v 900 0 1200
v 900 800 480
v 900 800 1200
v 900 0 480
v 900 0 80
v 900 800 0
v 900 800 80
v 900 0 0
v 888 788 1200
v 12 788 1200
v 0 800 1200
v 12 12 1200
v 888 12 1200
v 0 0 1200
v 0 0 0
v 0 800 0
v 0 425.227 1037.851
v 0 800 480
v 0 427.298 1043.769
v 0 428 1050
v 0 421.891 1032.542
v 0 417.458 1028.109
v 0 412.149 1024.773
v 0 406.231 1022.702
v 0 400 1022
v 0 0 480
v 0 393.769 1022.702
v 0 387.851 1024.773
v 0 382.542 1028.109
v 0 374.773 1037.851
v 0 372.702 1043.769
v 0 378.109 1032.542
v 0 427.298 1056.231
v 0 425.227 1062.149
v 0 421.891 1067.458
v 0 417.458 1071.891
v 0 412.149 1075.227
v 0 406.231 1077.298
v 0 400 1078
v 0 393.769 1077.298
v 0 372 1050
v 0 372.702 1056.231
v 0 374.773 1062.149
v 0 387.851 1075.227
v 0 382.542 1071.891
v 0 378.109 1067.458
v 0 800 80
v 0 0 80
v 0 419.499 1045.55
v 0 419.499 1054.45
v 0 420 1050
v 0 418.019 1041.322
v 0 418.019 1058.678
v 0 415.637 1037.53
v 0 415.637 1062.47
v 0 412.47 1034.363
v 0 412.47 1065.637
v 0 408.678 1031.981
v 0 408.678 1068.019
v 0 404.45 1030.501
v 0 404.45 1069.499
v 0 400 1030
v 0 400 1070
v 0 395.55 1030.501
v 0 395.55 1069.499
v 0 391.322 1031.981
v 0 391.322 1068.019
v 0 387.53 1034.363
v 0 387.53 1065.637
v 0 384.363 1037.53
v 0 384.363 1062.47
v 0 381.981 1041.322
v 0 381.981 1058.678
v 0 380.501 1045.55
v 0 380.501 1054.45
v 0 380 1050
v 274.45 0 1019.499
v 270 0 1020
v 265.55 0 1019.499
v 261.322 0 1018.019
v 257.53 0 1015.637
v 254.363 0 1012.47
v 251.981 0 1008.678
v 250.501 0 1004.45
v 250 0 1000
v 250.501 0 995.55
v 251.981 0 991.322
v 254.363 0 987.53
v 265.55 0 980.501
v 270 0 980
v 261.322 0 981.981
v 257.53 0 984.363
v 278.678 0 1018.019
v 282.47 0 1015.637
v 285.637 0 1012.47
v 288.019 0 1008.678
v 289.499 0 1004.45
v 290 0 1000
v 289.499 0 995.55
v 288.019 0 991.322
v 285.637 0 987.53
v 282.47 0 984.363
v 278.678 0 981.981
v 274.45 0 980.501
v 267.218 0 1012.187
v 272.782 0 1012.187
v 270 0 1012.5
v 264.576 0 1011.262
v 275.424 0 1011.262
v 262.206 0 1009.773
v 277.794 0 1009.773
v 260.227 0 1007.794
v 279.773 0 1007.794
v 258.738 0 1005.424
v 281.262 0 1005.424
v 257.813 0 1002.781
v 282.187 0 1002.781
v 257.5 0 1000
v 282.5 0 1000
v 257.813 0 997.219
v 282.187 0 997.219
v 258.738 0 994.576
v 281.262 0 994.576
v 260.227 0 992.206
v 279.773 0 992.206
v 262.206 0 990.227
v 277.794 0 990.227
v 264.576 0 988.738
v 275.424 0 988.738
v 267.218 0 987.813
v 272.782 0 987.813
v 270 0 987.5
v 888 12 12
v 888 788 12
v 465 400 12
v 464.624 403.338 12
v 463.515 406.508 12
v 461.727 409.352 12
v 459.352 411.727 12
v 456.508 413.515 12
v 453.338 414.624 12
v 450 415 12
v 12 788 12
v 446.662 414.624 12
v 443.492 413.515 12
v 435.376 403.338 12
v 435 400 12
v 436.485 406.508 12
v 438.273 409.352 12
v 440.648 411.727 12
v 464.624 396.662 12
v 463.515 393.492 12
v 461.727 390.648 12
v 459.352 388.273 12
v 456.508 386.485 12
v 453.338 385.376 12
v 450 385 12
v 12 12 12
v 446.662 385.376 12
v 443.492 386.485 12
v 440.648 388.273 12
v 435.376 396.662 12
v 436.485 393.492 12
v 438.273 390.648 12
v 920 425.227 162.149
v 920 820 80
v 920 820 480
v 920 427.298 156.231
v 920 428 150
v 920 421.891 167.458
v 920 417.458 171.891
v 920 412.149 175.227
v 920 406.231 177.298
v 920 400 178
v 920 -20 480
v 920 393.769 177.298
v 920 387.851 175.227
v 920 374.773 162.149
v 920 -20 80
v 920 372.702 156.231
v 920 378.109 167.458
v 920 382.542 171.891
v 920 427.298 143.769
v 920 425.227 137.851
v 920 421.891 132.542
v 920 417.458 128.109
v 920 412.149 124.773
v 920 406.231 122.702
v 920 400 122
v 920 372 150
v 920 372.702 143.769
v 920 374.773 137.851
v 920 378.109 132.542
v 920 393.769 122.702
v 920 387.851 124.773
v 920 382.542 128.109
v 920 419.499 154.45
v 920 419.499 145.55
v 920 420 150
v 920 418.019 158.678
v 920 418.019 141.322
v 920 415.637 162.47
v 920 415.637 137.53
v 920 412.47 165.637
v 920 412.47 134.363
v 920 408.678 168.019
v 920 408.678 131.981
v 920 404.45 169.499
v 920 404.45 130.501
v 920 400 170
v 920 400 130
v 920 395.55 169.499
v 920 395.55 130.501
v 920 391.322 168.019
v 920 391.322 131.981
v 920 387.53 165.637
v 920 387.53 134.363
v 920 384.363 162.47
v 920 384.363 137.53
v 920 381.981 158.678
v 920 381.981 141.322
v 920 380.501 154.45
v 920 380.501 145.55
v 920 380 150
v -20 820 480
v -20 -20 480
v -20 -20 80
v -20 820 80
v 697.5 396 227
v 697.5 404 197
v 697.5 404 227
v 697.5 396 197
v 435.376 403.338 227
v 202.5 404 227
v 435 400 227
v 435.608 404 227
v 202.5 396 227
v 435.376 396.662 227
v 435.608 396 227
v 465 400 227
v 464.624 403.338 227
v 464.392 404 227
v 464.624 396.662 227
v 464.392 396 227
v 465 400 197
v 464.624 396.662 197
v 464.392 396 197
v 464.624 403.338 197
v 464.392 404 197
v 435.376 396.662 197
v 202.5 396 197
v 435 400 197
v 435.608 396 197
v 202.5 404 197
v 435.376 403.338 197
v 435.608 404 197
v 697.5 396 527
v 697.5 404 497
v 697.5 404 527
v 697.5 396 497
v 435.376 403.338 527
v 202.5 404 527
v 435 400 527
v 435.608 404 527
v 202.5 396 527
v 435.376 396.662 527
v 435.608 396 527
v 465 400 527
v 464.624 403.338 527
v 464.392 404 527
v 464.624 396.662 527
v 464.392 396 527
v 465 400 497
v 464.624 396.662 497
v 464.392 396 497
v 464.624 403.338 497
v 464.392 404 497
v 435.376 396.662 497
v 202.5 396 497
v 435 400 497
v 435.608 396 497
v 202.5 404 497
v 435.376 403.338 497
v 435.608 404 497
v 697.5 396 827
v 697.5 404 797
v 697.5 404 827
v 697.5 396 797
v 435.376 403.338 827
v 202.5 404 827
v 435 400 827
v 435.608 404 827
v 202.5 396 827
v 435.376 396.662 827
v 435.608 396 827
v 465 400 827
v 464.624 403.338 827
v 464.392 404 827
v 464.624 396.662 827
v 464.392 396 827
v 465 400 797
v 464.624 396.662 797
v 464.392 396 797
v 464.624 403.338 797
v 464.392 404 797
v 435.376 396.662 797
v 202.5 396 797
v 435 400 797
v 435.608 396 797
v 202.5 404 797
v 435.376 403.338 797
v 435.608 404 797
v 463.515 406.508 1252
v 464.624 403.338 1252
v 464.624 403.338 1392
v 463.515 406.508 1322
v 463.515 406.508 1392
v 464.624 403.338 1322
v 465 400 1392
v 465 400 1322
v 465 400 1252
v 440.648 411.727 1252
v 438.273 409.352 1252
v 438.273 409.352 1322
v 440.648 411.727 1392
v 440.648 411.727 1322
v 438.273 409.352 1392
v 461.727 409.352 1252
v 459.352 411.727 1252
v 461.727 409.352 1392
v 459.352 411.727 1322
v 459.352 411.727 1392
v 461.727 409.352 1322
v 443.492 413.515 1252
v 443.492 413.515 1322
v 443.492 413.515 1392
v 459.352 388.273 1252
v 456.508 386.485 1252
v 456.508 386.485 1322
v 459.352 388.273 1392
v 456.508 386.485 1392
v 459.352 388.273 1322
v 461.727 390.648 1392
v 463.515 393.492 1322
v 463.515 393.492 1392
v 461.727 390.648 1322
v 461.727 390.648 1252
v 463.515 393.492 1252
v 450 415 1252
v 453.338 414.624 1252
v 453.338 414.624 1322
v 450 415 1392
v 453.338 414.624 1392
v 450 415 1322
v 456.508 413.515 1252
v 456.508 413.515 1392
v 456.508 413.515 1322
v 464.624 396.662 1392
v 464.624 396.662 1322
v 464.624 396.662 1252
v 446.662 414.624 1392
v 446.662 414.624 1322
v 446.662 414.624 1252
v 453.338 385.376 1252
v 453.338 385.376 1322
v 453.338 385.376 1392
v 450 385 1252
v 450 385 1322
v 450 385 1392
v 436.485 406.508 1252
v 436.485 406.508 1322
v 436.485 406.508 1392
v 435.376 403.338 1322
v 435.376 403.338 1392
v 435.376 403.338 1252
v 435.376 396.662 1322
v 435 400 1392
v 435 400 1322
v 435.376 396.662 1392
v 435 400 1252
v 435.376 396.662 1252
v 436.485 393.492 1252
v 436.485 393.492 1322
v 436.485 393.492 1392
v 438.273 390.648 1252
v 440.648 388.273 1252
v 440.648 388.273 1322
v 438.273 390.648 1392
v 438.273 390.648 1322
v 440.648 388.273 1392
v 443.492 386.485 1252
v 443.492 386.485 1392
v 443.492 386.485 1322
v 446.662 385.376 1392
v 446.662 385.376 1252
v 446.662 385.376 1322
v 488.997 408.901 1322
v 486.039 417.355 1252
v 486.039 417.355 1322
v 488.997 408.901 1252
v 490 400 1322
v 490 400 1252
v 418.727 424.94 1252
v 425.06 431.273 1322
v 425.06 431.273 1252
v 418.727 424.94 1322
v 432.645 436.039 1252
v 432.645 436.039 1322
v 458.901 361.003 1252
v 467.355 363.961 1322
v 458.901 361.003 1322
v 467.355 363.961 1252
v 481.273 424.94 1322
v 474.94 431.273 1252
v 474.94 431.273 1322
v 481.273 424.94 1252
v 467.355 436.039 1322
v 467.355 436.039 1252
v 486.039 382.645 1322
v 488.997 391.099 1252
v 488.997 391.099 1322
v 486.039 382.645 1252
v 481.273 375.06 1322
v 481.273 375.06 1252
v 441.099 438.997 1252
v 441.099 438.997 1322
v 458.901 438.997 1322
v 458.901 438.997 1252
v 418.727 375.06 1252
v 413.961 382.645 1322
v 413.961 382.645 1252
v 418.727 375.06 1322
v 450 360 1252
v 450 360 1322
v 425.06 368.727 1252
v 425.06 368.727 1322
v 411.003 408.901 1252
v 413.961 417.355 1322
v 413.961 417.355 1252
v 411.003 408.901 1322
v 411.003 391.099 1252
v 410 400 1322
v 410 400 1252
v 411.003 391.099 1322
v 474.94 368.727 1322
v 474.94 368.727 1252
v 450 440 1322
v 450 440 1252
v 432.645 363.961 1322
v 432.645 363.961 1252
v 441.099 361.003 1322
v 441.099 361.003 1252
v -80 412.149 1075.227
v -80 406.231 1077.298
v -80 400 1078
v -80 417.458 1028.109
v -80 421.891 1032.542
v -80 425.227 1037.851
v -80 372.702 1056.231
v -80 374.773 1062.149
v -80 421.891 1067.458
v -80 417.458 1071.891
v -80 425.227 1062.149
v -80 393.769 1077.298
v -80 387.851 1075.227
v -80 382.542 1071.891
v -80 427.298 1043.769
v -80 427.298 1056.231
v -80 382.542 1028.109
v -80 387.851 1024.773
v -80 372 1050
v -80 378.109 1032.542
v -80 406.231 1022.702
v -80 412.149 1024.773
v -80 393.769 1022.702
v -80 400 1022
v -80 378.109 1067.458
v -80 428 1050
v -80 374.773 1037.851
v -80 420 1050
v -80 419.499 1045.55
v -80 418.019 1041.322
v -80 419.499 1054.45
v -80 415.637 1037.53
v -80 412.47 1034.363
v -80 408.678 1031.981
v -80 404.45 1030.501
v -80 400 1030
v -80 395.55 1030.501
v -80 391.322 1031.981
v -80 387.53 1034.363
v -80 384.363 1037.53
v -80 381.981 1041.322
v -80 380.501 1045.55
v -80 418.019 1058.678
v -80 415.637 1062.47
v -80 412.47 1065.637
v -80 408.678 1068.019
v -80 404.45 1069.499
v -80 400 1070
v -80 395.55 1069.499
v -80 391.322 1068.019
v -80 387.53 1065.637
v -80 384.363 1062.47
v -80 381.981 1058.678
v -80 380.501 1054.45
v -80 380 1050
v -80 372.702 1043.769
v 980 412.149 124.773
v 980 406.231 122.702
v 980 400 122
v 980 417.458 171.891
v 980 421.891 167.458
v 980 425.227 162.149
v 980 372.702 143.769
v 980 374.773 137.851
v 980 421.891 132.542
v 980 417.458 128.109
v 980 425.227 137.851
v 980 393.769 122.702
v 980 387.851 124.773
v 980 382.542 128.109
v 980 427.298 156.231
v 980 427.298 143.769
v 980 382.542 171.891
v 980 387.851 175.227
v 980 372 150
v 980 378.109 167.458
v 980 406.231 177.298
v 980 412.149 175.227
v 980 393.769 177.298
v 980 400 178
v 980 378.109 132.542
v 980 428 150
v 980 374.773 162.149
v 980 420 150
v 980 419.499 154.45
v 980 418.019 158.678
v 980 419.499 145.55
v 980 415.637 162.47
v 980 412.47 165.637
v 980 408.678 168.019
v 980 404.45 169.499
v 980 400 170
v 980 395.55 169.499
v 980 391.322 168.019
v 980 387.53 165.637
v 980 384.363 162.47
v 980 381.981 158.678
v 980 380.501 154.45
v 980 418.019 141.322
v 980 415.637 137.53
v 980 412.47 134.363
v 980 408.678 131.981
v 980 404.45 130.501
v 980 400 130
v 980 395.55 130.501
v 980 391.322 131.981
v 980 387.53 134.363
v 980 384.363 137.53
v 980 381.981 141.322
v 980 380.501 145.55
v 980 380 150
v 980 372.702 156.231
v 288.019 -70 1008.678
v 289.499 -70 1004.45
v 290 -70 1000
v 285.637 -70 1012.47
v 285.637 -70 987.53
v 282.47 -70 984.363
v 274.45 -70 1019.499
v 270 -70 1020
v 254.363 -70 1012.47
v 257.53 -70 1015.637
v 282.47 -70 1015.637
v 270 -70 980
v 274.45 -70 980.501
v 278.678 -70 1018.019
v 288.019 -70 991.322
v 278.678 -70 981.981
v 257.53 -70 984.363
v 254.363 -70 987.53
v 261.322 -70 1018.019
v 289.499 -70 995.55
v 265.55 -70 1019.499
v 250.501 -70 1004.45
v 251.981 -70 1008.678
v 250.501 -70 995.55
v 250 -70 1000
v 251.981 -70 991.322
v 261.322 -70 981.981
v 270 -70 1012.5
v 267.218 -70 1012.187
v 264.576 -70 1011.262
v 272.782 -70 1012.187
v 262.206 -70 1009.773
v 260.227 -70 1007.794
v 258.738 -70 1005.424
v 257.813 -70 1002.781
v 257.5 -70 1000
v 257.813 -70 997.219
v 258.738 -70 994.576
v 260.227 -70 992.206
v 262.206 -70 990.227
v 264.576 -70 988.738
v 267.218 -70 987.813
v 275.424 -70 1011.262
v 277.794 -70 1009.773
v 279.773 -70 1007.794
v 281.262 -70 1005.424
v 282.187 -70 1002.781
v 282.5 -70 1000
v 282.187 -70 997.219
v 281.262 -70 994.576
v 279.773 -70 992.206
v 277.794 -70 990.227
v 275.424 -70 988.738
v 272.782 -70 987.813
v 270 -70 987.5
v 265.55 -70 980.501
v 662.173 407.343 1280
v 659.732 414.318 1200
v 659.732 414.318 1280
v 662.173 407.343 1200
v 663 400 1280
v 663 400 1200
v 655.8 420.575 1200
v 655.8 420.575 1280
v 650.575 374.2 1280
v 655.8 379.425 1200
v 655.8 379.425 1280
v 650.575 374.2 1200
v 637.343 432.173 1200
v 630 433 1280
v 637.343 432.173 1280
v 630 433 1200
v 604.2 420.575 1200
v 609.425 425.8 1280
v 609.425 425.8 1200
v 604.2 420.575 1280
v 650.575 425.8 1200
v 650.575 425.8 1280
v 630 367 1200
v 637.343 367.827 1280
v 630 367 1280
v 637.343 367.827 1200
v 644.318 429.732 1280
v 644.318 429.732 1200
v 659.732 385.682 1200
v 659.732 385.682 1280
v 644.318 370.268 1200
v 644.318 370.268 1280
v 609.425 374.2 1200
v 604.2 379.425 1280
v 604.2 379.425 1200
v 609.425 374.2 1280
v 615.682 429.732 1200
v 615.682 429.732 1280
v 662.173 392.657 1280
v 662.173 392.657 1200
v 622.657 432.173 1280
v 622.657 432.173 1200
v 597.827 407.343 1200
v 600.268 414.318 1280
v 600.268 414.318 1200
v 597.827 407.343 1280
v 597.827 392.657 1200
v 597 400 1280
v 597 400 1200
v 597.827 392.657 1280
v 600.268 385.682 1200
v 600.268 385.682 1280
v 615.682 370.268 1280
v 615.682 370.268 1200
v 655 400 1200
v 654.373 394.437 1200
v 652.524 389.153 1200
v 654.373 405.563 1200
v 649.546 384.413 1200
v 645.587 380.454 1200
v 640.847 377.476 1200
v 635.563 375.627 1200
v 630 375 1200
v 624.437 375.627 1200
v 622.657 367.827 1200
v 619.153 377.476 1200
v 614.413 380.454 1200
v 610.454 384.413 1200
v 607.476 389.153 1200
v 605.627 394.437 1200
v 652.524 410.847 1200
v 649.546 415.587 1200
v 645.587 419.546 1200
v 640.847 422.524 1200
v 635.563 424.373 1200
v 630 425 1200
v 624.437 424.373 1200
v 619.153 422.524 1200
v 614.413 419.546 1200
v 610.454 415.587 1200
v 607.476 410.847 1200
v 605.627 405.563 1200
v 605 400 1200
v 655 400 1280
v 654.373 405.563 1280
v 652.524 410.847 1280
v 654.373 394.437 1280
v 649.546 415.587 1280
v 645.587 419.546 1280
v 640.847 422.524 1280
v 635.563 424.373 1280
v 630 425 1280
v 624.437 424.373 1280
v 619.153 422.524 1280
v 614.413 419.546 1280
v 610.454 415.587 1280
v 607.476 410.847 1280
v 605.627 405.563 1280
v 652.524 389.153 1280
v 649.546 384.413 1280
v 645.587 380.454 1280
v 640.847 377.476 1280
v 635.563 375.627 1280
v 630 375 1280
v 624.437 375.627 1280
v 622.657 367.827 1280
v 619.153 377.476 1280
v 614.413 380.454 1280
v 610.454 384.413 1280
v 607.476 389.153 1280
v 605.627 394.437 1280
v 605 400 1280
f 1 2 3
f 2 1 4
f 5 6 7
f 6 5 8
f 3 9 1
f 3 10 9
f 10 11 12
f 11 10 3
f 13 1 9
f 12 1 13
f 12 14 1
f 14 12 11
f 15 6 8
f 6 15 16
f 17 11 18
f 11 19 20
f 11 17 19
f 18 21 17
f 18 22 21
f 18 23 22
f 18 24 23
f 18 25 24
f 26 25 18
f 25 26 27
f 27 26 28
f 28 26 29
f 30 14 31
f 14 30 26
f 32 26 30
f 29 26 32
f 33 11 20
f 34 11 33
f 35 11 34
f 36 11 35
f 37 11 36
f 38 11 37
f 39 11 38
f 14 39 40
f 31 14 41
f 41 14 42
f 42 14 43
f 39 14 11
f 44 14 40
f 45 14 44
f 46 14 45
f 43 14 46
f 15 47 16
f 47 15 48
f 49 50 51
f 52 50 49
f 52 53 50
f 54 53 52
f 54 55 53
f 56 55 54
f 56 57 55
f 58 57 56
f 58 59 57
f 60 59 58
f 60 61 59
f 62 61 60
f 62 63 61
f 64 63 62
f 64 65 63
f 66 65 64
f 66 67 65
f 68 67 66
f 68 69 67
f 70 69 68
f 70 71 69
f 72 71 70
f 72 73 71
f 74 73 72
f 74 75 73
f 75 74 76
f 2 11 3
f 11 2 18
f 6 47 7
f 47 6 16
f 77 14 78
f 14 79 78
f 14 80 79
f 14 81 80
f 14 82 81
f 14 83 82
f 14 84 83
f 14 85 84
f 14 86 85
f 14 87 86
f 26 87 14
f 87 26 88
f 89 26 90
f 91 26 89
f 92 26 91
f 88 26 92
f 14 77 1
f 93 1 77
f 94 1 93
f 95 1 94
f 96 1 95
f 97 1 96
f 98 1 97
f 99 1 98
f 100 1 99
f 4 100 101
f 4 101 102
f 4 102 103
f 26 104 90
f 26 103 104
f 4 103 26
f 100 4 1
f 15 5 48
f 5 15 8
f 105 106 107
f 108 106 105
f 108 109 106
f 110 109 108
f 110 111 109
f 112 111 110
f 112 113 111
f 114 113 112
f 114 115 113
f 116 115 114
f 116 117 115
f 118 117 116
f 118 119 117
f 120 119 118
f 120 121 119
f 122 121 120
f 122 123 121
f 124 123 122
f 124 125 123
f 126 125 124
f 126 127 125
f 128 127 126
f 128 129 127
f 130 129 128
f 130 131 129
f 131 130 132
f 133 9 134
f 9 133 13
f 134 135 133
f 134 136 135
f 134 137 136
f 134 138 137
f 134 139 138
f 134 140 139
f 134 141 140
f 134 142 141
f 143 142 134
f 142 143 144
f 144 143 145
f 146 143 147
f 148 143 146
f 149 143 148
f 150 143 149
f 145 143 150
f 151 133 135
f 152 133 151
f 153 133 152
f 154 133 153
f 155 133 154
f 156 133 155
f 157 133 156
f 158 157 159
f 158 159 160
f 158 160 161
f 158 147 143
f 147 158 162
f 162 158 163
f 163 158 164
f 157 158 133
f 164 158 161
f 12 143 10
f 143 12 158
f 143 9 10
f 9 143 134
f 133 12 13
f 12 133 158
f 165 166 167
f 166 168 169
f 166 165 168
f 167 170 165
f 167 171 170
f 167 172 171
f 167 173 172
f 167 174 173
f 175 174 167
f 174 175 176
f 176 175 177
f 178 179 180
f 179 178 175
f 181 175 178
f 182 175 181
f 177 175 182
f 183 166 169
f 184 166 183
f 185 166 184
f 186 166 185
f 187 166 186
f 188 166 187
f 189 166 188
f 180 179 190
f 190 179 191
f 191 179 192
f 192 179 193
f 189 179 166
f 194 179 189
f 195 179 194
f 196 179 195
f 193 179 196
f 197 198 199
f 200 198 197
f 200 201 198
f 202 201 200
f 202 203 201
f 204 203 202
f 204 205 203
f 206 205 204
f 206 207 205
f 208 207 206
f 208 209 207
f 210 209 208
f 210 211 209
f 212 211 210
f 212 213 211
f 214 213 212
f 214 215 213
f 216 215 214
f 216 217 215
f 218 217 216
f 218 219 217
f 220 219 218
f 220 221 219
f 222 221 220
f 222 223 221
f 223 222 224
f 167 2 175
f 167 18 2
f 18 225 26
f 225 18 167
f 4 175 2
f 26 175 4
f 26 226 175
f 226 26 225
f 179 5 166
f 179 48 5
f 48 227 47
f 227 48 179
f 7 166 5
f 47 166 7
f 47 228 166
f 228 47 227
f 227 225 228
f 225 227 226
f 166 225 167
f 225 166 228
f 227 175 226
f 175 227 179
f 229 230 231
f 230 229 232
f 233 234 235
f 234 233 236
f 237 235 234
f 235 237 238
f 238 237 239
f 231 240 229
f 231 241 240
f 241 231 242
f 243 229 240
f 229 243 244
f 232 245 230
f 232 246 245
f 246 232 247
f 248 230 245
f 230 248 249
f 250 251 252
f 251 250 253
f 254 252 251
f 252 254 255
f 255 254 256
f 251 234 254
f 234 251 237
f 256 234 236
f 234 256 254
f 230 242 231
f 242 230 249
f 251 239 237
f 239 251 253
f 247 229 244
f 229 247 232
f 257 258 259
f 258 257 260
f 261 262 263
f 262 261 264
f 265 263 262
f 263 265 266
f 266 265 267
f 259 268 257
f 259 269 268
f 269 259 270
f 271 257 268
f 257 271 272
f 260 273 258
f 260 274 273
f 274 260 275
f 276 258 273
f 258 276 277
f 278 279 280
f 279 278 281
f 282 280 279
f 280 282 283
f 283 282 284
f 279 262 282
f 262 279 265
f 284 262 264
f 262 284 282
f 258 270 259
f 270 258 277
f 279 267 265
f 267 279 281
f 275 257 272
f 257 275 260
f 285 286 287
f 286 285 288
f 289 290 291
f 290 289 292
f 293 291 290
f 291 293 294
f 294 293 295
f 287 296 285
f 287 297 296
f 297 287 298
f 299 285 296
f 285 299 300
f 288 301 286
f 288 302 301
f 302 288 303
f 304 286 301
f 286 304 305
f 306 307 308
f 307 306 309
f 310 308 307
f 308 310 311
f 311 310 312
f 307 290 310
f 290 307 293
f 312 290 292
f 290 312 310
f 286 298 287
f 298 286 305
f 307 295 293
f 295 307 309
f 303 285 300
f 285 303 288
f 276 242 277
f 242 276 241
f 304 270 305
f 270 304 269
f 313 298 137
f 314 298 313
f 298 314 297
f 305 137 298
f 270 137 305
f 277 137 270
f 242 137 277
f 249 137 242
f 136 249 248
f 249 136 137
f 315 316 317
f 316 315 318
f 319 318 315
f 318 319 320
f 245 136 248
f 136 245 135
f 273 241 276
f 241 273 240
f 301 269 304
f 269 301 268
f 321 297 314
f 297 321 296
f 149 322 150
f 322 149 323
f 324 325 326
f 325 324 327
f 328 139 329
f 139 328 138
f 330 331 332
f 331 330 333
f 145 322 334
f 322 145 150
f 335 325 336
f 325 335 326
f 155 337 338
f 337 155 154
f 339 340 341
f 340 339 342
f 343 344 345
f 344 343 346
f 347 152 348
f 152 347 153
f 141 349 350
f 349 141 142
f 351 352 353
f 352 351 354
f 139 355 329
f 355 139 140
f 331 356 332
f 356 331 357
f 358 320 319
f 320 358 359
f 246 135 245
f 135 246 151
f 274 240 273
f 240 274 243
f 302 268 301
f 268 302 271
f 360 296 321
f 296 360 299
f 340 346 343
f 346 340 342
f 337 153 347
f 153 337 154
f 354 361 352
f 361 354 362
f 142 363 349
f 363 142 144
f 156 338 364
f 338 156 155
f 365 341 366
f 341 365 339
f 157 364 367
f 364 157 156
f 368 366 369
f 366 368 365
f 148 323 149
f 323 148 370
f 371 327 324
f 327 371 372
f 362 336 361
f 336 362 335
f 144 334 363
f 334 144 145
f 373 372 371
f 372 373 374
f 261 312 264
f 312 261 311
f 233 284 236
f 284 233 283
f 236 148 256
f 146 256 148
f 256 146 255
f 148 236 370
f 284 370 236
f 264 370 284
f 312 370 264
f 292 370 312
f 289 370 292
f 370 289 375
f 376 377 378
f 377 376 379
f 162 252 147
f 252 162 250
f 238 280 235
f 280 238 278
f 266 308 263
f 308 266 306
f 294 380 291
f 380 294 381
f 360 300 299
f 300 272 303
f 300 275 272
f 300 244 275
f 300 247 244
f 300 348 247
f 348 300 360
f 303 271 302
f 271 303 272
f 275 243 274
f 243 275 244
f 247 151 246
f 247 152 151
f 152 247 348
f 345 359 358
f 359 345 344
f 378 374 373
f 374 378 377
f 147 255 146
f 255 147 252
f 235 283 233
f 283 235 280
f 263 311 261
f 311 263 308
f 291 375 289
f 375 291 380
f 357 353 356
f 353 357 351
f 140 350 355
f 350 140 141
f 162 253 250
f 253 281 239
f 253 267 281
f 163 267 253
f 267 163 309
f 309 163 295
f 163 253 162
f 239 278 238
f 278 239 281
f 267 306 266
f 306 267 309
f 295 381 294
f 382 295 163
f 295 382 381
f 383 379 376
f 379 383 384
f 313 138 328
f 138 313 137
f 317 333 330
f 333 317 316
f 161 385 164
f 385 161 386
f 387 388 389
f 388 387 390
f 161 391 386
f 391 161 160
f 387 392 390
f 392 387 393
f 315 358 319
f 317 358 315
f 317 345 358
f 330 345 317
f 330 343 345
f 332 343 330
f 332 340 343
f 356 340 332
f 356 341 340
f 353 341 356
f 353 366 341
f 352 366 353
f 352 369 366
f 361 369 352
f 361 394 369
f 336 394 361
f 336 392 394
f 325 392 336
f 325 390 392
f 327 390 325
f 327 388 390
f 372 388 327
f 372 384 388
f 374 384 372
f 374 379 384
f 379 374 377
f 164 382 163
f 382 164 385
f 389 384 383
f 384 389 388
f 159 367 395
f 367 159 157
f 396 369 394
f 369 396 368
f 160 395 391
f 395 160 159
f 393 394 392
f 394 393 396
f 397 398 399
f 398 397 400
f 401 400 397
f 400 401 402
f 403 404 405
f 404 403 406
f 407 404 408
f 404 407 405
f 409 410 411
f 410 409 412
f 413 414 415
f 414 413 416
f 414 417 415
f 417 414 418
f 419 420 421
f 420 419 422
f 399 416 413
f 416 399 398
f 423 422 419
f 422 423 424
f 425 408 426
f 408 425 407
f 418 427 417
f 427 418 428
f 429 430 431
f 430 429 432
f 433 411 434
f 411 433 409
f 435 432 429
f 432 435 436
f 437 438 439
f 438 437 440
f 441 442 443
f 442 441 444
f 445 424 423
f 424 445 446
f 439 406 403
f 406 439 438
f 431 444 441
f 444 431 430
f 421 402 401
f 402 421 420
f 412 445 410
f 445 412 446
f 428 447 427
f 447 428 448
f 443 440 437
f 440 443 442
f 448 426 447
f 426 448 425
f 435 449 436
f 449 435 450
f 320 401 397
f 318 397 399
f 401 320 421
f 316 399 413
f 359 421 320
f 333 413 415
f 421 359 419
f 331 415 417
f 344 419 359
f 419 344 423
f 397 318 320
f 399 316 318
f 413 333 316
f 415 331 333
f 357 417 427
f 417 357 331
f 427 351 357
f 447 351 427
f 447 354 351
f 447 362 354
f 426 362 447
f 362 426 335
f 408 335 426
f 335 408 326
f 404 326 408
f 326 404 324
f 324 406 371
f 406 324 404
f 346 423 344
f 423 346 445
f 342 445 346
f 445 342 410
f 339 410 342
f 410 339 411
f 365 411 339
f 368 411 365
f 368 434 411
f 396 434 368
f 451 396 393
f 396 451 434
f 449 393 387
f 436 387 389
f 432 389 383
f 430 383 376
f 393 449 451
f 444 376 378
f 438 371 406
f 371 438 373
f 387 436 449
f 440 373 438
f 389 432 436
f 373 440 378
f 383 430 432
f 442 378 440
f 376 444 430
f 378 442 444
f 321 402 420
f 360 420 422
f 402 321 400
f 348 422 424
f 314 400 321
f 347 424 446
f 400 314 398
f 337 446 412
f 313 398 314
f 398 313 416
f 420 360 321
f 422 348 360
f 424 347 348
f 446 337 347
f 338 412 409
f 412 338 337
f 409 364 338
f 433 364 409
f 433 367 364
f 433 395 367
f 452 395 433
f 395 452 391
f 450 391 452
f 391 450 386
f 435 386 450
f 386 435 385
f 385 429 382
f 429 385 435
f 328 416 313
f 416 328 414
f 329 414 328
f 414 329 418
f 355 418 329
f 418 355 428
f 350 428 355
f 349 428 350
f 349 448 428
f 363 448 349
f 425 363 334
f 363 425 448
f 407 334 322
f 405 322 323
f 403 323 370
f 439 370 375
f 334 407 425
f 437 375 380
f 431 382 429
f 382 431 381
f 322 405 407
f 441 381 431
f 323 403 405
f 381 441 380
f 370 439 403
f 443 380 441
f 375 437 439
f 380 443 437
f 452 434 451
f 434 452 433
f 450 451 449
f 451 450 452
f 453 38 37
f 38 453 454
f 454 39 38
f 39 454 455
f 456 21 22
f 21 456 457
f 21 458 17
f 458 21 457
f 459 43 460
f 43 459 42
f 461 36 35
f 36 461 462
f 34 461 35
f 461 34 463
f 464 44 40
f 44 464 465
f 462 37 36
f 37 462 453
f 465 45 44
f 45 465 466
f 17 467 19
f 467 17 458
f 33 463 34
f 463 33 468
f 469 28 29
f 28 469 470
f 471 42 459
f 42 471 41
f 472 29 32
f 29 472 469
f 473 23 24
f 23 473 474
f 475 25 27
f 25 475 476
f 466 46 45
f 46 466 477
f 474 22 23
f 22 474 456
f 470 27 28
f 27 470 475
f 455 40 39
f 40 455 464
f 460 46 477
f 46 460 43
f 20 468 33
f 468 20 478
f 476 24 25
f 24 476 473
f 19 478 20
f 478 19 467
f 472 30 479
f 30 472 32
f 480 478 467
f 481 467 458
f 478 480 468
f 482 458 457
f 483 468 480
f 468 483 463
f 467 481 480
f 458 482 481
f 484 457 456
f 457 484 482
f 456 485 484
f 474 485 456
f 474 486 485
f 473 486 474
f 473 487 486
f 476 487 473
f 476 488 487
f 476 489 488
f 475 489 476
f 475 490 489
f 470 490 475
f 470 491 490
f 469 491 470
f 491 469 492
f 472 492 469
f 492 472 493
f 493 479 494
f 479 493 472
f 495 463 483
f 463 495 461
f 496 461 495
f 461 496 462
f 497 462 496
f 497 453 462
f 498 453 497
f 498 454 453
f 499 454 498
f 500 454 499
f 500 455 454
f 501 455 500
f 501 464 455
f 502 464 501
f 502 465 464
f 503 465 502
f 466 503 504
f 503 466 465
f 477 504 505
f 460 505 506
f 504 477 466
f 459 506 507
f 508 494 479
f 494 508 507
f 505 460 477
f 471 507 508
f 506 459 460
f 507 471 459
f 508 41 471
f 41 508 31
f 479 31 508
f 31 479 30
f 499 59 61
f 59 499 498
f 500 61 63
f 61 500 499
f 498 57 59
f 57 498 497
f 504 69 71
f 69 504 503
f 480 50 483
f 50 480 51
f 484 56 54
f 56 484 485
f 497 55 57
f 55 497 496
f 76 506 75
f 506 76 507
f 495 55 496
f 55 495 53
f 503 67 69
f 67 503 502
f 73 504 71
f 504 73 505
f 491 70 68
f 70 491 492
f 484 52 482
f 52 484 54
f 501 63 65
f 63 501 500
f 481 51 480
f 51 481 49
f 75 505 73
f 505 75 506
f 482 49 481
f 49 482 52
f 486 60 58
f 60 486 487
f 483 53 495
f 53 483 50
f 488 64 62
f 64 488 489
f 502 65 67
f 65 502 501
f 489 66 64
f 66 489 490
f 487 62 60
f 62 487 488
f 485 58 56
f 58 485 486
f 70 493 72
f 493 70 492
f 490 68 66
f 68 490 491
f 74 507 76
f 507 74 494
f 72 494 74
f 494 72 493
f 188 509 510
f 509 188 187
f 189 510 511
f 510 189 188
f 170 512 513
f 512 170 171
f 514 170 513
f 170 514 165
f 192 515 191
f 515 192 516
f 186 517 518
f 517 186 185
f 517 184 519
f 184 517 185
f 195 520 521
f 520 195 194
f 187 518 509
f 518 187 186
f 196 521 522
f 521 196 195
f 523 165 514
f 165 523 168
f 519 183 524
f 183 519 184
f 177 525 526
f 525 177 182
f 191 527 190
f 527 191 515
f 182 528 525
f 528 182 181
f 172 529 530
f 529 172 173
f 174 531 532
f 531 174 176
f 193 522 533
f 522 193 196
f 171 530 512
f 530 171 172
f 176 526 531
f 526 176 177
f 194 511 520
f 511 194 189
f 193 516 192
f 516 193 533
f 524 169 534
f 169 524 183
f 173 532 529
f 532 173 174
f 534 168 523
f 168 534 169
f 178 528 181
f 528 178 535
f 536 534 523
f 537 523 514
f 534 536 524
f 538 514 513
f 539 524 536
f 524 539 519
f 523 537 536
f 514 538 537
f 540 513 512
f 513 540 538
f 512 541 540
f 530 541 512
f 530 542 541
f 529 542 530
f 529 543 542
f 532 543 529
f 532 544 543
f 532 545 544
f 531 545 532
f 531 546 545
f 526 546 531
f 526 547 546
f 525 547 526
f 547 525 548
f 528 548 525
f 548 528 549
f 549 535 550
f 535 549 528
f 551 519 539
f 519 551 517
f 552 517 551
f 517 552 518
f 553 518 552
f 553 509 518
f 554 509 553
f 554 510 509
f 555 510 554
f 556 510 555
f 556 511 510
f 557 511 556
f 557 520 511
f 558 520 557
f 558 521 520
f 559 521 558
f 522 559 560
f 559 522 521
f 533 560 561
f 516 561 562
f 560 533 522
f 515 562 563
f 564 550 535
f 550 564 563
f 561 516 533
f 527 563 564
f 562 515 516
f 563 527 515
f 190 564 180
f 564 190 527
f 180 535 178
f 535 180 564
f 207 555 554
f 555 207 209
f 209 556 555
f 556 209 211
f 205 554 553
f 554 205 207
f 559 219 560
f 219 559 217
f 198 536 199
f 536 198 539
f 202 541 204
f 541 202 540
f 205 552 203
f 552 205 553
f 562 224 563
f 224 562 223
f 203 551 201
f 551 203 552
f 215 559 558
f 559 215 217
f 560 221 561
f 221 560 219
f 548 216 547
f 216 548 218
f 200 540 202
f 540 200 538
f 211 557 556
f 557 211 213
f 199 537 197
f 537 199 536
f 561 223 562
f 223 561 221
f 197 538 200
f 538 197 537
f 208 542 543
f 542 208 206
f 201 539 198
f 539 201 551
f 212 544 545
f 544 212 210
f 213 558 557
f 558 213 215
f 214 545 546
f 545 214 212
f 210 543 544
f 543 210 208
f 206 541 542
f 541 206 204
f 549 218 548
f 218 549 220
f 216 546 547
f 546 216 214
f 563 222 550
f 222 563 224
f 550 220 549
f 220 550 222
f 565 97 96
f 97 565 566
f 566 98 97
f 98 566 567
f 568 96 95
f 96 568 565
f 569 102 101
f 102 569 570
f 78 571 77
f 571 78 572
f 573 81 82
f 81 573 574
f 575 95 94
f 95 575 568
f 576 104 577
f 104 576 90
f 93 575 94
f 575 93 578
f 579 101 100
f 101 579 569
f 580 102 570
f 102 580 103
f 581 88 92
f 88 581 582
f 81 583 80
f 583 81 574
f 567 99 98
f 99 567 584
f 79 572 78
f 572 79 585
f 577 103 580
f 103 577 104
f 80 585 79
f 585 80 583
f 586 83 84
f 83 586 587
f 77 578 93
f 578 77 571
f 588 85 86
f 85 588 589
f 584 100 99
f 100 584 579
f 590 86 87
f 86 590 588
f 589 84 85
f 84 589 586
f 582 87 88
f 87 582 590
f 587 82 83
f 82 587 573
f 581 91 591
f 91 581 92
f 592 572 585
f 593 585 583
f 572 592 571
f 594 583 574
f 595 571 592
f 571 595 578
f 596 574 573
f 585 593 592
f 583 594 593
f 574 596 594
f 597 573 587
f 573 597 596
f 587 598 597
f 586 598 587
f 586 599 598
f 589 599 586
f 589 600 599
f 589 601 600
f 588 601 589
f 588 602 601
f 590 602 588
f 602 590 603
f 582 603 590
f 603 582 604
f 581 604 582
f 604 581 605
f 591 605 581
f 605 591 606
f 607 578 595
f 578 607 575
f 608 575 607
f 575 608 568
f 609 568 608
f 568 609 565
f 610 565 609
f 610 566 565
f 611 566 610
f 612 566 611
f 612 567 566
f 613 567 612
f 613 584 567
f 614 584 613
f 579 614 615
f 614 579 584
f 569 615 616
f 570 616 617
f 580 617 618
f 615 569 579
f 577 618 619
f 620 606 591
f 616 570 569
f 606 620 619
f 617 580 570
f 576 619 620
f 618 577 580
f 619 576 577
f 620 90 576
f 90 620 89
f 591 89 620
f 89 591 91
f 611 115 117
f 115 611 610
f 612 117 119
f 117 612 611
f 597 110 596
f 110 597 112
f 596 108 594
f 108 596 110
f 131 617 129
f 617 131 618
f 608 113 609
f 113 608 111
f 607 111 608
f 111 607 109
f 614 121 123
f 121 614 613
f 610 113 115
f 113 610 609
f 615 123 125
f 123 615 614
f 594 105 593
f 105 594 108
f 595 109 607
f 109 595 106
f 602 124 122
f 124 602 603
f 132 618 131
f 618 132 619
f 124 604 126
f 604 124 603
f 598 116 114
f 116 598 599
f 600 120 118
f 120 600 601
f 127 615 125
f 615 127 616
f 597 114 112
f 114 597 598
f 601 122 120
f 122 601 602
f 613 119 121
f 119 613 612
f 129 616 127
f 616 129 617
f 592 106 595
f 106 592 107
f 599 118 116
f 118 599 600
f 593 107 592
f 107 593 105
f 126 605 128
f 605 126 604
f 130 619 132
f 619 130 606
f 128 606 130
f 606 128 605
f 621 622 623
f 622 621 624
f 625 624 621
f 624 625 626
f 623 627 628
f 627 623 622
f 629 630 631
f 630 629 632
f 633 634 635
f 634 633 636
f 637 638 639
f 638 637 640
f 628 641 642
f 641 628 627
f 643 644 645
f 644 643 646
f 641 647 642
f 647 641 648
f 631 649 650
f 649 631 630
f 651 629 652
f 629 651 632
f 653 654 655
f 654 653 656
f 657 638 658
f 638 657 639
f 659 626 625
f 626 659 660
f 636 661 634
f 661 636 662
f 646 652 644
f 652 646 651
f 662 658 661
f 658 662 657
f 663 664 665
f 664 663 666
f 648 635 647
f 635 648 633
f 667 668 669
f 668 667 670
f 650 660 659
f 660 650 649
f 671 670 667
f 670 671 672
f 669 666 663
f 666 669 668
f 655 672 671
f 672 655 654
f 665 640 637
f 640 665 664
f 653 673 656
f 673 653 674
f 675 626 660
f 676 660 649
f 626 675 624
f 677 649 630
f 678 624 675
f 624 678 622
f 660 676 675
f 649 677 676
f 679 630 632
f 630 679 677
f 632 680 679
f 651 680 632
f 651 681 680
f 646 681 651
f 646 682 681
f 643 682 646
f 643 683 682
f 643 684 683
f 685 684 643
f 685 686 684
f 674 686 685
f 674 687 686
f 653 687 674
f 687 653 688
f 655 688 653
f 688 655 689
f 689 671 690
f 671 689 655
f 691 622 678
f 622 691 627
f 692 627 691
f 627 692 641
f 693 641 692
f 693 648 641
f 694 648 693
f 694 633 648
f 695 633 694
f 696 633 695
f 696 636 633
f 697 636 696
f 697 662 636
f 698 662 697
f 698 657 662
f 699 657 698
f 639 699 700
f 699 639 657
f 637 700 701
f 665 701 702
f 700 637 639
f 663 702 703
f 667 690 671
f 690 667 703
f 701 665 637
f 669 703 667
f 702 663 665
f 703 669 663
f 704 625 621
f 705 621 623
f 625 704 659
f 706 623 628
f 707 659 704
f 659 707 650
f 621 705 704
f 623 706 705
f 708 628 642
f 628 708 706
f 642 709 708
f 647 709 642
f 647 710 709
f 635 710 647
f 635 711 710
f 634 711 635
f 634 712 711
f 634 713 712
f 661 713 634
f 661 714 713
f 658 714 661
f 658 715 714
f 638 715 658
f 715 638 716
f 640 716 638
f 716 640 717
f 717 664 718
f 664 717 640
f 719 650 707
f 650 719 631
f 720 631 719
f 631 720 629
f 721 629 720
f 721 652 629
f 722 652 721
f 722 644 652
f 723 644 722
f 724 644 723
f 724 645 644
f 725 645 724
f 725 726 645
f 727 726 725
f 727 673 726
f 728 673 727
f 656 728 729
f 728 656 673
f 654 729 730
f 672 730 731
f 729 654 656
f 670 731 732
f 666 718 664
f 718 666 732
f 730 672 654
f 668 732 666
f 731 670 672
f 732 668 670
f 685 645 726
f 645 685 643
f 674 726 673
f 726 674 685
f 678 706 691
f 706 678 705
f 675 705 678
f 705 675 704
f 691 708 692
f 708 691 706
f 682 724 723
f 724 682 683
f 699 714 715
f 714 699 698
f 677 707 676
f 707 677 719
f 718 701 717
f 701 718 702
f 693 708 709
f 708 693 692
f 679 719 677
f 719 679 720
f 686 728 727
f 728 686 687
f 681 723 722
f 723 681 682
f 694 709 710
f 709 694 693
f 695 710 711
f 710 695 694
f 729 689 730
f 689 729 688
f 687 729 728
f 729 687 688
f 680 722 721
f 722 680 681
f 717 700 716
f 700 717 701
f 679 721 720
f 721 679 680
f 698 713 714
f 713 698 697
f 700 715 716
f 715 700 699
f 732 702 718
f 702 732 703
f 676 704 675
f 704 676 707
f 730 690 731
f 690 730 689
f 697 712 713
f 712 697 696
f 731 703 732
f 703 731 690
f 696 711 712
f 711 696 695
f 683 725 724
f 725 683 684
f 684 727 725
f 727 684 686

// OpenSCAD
// file: ../params.scad
// Shared millimetre parameters. Keep in lockstep with freecad/params.py.
// Module scale: 150 kg/day wet train. Walls are CPVC sheet, not metal.

$fn = 36;

WALL        = 12;     // CPVC sheet thickness
FLOOR       = 16;     // floor plate (trough sits on this)

// LEACH CSTR 1 — inside liquor box
CSTR_L      = 2000;
CSTR_W      = 1200;
CSTR_H      = 1400;   // liquid + freeboard
FREEBOARD   = 200;

// CSTR 2 weir (same vessel, +X wall)
WEIR_W      = 450;
WEIR_CREST  = CSTR_H - FREEBOARD;   // from inner floor
WEIR_SLOT_H = 80;
WEIR_LIP    = 120;    // external spout projection

// CSTR 3 floor auger — injection-molded PVC / FG
AUGER_D     = 140;    // flight OD
AUGER_SHAFT = 40;
AUGER_PITCH = 110;
AUGER_TROUGH_W = 180;
AUGER_TROUGH_H = 110;
AUGER_OFFSET_Y = 280; // trough centreline from inner -Y wall
AUGER_INCLINE  = 28;  // deg, lifts out of liquor toward +X

// mixer / nozzles (lid)
MIXER_D     = 50;
GAS_D       = 80;     // acid-gas takeoff
DROP_X      = 80;     // inner-X of shred drop slot
DROP_L      = 400;
DROP_W      = 250;
DROP_COAM   = 80;     // raised coaming around the slot

// LEACHATE PUMP / coarse strainer — −X wall, opposite the weir
PUMP_D      = 80;     // DN80
PUMP_Z      = 450;    // centreline above inner floor (submerged)
PUMP_Y      = 900;    // centreline from inner −Y (away from auger)
STRAINER_L  = 180;
STRAINER_W  = 140;
STRAINER_H  = 160;

// mezzanine feed train
MEZZ_H      = 2200;   // platform top above tank outer floor
MEZZ_L      = 1600;   // platform length in −X
MEZZ_THK    = 12;
HOPPER_L    = 700;
HOPPER_W    = 600;
HOPPER_H    = 800;
SHRED_L     = 500;
SHRED_W     = 500;
SHRED_H     = 450;
CONV_W      = 240;
CONV_H      = 120;
CONV_PLATE  = 6;      // trough plate
CONV_FLANGE = 40;
CONV_SPRING_D = 50;
CONV_SPRING_H = 80;
CONV_BOLT   = 10;     // M10 clearance
CONV_LEN    = 1800;   // default standalone length; plant instance is computed
DUST_D      = 150;    // dust-hood outlet to DUST header
AUGER_LIFT_L = 700;

// dewater belts + split (Phase A 4–6)
FDEW_L      = 1800;
FDEW_W      = 450;
FDEW_H      = 80;
FDEW_RISE   = 120;    // solids end higher so liquor runs back to weir
SDEW_L      = 1400;
SDEW_W      = 220;
SDEW_H      = 80;
SPLIT_L     = 600;
SPLIT_W     = 500;
SPLIT_H     = 400;
STUB_L      = 400;
STUB_W      = 300;
STUB_H      = 250;

// EW funnel cell
EW_L        = 600;    // along aisle (overflow direction)
EW_W        = 420;    // anode-cathode depth
EW_H        = 650;    // rectangular body
EW_FUNNEL_H = 220;
EW_VALVE_D  = 50;
EW_VALVE_L  = 60;
EW_MEM_T    = 4;      // CEM
EW_SLOT     = 10;     // membrane cassette slot
EW_PITCH    = 750;    // aisle spacing, centre to centre
AISLE_X0    = 200;
AISLE_Y     = -(EW_W + 2*WALL) - 400;
AISLE_Z     = 400;
BUND_H      = 150;
BUND_PAD    = 250;
SUMP_L      = 400;
SUMP_W      = 400;
SUMP_H      = 300;
VDF_D       = 700;
VDF_L       = 900;
PAIL_W      = 180;
HDR_D       = 80;
HDR_Z       = 1400;
PYRO_D      = 320;
PYRO_L      = 2800;

// Campus envelopes — lockstep with freecad/params.py
FARM_X=12000; FARM_Y=8000; FARM_L=12000; FARM_W=8000; FARM_H=4500;
FAB_X=12000;  FAB_Y=-6000; FAB_L=8000;   FAB_W=6000;  FAB_H=4000;
HAB_X=-8000;  HAB_Y=8000;  HAB_L=8000;   HAB_W=6000;  HAB_H=3200;
CRYO_X=-6000; CRYO_Y=-4000; CRYO_L=4000; CRYO_W=3000; CRYO_H=3000;
MFG_X=2000;   MFG_Y=9000;  MFG_L=6000;   MFG_W=4000;  MFG_H=3500;

LIFE_Z_GREY=900; LIFE_Z_UPW=1100; LIFE_Z_ETCH=1300;
LIFE_Z_O2=2800; LIFE_Z_N2=3000; LIFE_Z_CO2=3200;
LIFE_D_GREY=50; LIFE_D_UPW=40; LIFE_D_ETCH=32;
LIFE_D_GAS=25; LIFE_D_CO2=40;
// main file
// CRU — chlorate finish hold. Alkali-tower liquor (NaCl + NaClO) held
// hot and alkaline until 3 NaClO → 2 NaCl + NaClO3. Then + BMED HCl
// is REGEN LEACH to N5 on CSTR 1.
// Wall CPVC or PVDF. Not PP. Vent to HDR_ACID_GAS. Liquor never to sewer.
include <../params.scad>;
$fn = 28;

CRU_L = 900;
CRU_W = 800;
CRU_H = 1200;

module cru_shell() {
    difference() {
        cube([CRU_L, CRU_W, CRU_H]);
        translate([WALL, WALL, WALL])
            cube([CRU_L-2*WALL, CRU_W-2*WALL, CRU_H]);
    }
}

module cru_jacket() {
    // Q3 / electric pad — keep 70-80 C for disproportionation
    translate([-20, -20, 80])
        difference() {
            cube([CRU_L+40, CRU_W+40, 400]);
            translate([20, 20, -1]) cube([CRU_L, CRU_W, 402]);
        }
}

module cru_agitator() {
    translate([CRU_L/2, CRU_W/2, WALL])
        union() {
            cylinder(h=CRU_H + 180, d=30);
            for (z = [200, 500, 800])
                translate([0, 0, z]) cube([CRU_L*0.55, 8, 30], center=true);
            translate([0, 0, CRU_H + 40]) cylinder(h=70, d=80);
        }
}

module cru_nozzles() {
    // in from alkali sump DN40
    translate([0, CRU_W/2, CRU_H-150])
        rotate([0, -90, 0])
            difference() { cylinder(h=80, d=56); translate([0,0,-1]) cylinder(h=82, d=40); }
    // out to N5 / REGEN LEACH DN40
    translate([CRU_L, CRU_W/2, 150])
        rotate([0, 90, 0])
            difference() { cylinder(h=80, d=56); translate([0,0,-1]) cylinder(h=82, d=40); }
    // BMED HCl trim DN25
    translate([CRU_L*0.3, 0, CRU_H-200])
        rotate([90, 0, 0])
            difference() { cylinder(h=70, d=40); translate([0,0,-1]) cylinder(h=72, d=25); }
    // vent DN50 to HDR_ACID_GAS
    translate([CRU_L*0.7, CRU_W/2, CRU_H])
        difference() { cylinder(h=80, d=66); translate([0,0,-1]) cylinder(h=82, d=50); }
}

module mfg_cru() {
    cru_shell();
    cru_jacket();
    cru_agitator();
    cru_nozzles();
}

mfg_cru();
